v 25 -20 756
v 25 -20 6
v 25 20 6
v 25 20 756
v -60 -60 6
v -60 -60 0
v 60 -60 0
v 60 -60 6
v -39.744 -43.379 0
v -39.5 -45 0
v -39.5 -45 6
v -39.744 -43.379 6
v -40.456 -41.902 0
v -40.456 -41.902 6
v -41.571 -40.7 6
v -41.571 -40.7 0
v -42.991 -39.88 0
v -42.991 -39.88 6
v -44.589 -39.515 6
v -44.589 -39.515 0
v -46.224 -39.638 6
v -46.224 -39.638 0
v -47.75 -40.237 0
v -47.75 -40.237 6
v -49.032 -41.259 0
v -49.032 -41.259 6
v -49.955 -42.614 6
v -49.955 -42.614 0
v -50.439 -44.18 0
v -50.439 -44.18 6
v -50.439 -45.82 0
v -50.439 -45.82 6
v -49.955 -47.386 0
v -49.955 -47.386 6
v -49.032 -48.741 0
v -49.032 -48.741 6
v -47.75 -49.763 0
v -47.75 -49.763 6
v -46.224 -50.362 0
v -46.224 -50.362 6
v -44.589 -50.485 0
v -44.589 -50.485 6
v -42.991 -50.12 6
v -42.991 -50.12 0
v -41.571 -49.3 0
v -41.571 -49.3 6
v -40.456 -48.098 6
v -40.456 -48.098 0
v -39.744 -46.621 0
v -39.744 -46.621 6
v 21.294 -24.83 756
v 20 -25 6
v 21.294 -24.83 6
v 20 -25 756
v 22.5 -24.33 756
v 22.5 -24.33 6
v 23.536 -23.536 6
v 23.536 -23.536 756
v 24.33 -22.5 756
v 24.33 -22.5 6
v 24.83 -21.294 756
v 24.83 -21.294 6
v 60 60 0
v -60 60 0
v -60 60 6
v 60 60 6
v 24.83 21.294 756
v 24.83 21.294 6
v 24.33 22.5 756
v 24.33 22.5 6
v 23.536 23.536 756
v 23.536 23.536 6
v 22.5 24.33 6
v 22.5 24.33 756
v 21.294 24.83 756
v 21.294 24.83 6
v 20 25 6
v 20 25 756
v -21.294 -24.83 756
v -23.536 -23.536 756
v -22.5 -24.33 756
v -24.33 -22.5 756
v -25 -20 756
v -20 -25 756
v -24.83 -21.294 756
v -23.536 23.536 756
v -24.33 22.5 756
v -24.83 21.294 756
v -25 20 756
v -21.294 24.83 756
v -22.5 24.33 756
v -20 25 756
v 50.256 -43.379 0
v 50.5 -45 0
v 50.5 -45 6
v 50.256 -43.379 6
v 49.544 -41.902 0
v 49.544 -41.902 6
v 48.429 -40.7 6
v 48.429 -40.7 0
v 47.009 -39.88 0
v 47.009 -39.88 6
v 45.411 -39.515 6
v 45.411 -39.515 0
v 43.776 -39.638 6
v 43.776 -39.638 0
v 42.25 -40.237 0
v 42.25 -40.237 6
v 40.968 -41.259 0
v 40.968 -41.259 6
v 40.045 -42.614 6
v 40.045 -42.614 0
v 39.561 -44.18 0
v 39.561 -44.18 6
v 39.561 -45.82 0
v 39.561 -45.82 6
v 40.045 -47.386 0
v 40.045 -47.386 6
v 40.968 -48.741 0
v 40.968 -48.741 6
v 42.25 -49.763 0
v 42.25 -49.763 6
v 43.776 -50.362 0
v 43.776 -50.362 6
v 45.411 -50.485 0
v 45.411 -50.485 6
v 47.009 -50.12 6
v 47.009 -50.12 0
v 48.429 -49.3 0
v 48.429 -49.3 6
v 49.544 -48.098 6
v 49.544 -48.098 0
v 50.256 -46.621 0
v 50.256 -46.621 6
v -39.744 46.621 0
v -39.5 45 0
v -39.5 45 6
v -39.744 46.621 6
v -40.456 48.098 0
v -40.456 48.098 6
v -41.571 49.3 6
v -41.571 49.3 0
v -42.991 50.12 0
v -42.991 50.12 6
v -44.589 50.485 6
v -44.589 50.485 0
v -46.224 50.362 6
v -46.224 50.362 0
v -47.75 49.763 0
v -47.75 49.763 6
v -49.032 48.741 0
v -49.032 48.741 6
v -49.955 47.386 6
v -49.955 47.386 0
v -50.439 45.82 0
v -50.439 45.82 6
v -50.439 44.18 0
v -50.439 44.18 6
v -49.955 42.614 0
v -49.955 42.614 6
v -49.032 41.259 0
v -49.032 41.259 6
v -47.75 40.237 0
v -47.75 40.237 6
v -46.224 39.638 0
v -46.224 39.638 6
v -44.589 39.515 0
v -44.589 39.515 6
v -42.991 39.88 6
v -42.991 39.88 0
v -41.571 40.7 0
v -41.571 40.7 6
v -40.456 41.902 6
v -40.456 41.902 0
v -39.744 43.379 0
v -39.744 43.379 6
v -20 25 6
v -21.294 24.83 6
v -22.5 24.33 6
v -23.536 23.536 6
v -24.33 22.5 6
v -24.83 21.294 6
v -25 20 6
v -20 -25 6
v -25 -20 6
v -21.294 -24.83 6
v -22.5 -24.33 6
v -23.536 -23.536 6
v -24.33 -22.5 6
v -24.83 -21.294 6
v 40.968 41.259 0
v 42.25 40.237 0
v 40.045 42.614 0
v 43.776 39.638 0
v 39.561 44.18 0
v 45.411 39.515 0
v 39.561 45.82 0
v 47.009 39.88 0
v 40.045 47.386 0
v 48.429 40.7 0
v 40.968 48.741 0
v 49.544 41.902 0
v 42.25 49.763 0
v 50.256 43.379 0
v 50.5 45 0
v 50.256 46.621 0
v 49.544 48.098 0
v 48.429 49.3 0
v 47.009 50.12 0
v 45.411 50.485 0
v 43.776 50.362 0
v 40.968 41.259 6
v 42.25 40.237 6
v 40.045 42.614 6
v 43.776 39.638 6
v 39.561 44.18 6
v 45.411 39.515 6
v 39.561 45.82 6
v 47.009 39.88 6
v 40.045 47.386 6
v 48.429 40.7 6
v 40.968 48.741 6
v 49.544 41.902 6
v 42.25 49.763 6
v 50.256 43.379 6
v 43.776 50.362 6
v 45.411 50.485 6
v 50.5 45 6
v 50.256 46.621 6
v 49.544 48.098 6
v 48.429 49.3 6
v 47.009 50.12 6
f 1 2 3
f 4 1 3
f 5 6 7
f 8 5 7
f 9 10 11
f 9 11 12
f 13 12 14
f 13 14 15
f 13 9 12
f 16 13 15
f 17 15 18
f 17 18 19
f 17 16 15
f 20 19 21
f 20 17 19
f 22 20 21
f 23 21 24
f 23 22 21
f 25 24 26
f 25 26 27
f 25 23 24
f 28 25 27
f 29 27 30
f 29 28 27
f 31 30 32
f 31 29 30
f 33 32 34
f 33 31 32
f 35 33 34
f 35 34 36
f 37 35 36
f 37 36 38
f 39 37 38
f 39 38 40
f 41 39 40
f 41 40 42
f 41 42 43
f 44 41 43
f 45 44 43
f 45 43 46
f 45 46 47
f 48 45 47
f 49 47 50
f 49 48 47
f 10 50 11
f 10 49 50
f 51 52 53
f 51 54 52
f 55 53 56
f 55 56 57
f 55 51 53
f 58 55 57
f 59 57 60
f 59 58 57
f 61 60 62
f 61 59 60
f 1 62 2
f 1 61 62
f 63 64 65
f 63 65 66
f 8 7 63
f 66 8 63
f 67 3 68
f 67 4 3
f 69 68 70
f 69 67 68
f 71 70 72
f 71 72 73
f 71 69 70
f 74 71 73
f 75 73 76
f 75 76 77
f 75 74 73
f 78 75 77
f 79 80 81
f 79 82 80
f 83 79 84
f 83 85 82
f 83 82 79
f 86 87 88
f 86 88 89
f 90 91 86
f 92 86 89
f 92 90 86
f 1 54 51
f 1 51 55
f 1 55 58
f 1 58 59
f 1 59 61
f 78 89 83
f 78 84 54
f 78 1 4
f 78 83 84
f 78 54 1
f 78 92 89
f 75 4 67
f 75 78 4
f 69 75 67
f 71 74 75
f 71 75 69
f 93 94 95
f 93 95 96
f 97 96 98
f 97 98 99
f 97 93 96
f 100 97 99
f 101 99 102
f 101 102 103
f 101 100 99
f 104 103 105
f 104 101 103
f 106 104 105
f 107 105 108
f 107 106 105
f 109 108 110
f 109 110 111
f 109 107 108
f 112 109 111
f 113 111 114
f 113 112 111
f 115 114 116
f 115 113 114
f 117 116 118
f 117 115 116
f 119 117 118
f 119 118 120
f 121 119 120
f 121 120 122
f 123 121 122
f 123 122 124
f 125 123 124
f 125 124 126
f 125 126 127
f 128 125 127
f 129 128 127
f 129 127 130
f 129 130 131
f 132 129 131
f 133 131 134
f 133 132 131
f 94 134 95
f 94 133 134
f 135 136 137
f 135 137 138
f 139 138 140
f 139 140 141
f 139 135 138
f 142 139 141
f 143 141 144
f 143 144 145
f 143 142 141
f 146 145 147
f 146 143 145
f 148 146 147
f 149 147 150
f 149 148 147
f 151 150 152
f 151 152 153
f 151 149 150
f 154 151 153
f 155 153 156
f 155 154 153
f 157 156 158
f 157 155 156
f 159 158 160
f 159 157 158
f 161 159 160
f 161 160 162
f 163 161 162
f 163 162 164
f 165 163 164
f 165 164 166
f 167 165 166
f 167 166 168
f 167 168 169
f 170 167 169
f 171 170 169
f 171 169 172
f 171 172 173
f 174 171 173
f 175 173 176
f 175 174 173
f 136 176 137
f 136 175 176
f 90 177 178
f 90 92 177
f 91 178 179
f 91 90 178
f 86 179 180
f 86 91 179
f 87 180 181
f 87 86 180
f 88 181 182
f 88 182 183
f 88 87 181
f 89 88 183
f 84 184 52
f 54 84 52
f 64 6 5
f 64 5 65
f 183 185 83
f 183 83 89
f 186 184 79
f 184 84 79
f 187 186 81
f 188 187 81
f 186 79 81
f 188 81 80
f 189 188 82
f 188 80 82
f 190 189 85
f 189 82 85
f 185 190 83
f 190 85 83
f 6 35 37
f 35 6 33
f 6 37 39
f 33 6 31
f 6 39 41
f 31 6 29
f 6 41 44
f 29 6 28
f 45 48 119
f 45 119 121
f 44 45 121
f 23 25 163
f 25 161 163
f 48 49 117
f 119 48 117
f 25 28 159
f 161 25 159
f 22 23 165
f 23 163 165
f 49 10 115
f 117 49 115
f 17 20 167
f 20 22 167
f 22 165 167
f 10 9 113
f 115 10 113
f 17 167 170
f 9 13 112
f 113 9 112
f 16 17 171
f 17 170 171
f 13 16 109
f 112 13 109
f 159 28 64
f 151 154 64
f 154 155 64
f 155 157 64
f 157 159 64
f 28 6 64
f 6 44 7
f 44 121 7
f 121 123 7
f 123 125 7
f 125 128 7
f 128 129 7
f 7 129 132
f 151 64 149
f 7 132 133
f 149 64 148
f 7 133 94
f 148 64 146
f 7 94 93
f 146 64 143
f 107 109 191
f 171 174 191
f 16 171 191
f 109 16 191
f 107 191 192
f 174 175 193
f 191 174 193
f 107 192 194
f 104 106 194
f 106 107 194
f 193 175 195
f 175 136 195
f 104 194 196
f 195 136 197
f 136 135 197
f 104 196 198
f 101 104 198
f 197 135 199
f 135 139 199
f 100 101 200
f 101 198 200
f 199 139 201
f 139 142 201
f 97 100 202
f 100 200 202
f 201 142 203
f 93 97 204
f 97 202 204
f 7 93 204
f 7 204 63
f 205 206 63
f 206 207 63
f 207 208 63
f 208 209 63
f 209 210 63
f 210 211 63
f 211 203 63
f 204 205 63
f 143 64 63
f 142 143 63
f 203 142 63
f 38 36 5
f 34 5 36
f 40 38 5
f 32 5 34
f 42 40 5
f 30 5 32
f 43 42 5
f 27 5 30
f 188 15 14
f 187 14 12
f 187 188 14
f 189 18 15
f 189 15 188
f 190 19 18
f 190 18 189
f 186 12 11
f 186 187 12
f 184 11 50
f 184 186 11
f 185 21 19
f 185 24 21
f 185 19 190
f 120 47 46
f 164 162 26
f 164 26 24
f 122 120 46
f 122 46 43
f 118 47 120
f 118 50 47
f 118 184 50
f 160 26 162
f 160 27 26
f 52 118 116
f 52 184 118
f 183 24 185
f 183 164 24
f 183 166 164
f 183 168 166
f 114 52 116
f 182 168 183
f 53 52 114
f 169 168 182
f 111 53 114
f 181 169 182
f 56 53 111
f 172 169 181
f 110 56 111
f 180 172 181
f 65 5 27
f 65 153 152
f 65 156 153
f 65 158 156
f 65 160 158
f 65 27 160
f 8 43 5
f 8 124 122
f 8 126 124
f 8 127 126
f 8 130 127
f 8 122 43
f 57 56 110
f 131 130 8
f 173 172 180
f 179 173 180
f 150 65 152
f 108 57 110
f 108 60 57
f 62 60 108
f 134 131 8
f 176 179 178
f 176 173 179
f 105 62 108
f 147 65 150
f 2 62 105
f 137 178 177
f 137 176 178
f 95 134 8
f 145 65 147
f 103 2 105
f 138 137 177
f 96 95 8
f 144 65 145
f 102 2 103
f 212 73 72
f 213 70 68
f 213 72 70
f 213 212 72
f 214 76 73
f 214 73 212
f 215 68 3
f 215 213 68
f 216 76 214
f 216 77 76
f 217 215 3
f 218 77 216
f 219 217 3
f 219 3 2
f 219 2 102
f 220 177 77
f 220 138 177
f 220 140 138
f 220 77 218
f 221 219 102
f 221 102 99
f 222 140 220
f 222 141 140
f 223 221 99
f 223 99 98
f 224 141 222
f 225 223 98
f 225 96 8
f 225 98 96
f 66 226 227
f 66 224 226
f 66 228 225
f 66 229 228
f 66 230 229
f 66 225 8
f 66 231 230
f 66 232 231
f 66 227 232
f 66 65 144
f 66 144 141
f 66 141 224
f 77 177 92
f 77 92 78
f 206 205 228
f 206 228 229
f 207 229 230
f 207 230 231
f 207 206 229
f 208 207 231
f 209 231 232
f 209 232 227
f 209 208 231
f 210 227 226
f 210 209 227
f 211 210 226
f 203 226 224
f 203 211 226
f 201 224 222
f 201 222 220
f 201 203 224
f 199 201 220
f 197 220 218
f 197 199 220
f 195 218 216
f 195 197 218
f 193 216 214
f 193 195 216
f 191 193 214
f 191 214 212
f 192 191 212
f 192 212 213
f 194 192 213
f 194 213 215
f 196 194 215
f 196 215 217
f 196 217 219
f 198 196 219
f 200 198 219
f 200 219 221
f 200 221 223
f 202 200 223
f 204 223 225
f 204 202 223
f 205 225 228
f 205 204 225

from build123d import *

# Parameters (mm, degrees)
F0_W     = 120
F0_H     = 120
F0_R     = 5.5
F1_DEPTH = 6
F2_W     = 50
F2_H     = 50
F3_DEPTH = 750
F4_R     = 5


# Not quite as in the source:
# - a feature names something its author has since deleted; it is built from what else it names


with BuildPart() as f1:
    # F0 (on Top) → F1 (new body)
    with BuildSketch(Plane.XY):
        Rectangle(F0_W, F0_H)
        with Locations((-45, -45)):
            Circle(F0_R, mode=Mode.SUBTRACT)
        with Locations((45, -45)):
            Circle(F0_R, mode=Mode.SUBTRACT)
        with Locations((-45, 45)):
            Circle(F0_R, mode=Mode.SUBTRACT)
        with Locations((45, 45)):
            Circle(F0_R, mode=Mode.SUBTRACT)
    extrude(amount=F1_DEPTH)

    # F2 (on face) → F3 (join)
    with BuildSketch(Plane.XY.offset(6)):
        Rectangle(F2_W, F2_H)
    extrude(amount=F3_DEPTH)

    # F4
    f4_edges = [f1.edges().sort_by_distance(p)[0] for p in [
        (-25, -25, 381),
        (25, -25, 381),
        (25, 25, 381),
        (-25, 25, 381),
    ]]
    fillet(f4_edges, radius=F4_R)


solid = f1.part
